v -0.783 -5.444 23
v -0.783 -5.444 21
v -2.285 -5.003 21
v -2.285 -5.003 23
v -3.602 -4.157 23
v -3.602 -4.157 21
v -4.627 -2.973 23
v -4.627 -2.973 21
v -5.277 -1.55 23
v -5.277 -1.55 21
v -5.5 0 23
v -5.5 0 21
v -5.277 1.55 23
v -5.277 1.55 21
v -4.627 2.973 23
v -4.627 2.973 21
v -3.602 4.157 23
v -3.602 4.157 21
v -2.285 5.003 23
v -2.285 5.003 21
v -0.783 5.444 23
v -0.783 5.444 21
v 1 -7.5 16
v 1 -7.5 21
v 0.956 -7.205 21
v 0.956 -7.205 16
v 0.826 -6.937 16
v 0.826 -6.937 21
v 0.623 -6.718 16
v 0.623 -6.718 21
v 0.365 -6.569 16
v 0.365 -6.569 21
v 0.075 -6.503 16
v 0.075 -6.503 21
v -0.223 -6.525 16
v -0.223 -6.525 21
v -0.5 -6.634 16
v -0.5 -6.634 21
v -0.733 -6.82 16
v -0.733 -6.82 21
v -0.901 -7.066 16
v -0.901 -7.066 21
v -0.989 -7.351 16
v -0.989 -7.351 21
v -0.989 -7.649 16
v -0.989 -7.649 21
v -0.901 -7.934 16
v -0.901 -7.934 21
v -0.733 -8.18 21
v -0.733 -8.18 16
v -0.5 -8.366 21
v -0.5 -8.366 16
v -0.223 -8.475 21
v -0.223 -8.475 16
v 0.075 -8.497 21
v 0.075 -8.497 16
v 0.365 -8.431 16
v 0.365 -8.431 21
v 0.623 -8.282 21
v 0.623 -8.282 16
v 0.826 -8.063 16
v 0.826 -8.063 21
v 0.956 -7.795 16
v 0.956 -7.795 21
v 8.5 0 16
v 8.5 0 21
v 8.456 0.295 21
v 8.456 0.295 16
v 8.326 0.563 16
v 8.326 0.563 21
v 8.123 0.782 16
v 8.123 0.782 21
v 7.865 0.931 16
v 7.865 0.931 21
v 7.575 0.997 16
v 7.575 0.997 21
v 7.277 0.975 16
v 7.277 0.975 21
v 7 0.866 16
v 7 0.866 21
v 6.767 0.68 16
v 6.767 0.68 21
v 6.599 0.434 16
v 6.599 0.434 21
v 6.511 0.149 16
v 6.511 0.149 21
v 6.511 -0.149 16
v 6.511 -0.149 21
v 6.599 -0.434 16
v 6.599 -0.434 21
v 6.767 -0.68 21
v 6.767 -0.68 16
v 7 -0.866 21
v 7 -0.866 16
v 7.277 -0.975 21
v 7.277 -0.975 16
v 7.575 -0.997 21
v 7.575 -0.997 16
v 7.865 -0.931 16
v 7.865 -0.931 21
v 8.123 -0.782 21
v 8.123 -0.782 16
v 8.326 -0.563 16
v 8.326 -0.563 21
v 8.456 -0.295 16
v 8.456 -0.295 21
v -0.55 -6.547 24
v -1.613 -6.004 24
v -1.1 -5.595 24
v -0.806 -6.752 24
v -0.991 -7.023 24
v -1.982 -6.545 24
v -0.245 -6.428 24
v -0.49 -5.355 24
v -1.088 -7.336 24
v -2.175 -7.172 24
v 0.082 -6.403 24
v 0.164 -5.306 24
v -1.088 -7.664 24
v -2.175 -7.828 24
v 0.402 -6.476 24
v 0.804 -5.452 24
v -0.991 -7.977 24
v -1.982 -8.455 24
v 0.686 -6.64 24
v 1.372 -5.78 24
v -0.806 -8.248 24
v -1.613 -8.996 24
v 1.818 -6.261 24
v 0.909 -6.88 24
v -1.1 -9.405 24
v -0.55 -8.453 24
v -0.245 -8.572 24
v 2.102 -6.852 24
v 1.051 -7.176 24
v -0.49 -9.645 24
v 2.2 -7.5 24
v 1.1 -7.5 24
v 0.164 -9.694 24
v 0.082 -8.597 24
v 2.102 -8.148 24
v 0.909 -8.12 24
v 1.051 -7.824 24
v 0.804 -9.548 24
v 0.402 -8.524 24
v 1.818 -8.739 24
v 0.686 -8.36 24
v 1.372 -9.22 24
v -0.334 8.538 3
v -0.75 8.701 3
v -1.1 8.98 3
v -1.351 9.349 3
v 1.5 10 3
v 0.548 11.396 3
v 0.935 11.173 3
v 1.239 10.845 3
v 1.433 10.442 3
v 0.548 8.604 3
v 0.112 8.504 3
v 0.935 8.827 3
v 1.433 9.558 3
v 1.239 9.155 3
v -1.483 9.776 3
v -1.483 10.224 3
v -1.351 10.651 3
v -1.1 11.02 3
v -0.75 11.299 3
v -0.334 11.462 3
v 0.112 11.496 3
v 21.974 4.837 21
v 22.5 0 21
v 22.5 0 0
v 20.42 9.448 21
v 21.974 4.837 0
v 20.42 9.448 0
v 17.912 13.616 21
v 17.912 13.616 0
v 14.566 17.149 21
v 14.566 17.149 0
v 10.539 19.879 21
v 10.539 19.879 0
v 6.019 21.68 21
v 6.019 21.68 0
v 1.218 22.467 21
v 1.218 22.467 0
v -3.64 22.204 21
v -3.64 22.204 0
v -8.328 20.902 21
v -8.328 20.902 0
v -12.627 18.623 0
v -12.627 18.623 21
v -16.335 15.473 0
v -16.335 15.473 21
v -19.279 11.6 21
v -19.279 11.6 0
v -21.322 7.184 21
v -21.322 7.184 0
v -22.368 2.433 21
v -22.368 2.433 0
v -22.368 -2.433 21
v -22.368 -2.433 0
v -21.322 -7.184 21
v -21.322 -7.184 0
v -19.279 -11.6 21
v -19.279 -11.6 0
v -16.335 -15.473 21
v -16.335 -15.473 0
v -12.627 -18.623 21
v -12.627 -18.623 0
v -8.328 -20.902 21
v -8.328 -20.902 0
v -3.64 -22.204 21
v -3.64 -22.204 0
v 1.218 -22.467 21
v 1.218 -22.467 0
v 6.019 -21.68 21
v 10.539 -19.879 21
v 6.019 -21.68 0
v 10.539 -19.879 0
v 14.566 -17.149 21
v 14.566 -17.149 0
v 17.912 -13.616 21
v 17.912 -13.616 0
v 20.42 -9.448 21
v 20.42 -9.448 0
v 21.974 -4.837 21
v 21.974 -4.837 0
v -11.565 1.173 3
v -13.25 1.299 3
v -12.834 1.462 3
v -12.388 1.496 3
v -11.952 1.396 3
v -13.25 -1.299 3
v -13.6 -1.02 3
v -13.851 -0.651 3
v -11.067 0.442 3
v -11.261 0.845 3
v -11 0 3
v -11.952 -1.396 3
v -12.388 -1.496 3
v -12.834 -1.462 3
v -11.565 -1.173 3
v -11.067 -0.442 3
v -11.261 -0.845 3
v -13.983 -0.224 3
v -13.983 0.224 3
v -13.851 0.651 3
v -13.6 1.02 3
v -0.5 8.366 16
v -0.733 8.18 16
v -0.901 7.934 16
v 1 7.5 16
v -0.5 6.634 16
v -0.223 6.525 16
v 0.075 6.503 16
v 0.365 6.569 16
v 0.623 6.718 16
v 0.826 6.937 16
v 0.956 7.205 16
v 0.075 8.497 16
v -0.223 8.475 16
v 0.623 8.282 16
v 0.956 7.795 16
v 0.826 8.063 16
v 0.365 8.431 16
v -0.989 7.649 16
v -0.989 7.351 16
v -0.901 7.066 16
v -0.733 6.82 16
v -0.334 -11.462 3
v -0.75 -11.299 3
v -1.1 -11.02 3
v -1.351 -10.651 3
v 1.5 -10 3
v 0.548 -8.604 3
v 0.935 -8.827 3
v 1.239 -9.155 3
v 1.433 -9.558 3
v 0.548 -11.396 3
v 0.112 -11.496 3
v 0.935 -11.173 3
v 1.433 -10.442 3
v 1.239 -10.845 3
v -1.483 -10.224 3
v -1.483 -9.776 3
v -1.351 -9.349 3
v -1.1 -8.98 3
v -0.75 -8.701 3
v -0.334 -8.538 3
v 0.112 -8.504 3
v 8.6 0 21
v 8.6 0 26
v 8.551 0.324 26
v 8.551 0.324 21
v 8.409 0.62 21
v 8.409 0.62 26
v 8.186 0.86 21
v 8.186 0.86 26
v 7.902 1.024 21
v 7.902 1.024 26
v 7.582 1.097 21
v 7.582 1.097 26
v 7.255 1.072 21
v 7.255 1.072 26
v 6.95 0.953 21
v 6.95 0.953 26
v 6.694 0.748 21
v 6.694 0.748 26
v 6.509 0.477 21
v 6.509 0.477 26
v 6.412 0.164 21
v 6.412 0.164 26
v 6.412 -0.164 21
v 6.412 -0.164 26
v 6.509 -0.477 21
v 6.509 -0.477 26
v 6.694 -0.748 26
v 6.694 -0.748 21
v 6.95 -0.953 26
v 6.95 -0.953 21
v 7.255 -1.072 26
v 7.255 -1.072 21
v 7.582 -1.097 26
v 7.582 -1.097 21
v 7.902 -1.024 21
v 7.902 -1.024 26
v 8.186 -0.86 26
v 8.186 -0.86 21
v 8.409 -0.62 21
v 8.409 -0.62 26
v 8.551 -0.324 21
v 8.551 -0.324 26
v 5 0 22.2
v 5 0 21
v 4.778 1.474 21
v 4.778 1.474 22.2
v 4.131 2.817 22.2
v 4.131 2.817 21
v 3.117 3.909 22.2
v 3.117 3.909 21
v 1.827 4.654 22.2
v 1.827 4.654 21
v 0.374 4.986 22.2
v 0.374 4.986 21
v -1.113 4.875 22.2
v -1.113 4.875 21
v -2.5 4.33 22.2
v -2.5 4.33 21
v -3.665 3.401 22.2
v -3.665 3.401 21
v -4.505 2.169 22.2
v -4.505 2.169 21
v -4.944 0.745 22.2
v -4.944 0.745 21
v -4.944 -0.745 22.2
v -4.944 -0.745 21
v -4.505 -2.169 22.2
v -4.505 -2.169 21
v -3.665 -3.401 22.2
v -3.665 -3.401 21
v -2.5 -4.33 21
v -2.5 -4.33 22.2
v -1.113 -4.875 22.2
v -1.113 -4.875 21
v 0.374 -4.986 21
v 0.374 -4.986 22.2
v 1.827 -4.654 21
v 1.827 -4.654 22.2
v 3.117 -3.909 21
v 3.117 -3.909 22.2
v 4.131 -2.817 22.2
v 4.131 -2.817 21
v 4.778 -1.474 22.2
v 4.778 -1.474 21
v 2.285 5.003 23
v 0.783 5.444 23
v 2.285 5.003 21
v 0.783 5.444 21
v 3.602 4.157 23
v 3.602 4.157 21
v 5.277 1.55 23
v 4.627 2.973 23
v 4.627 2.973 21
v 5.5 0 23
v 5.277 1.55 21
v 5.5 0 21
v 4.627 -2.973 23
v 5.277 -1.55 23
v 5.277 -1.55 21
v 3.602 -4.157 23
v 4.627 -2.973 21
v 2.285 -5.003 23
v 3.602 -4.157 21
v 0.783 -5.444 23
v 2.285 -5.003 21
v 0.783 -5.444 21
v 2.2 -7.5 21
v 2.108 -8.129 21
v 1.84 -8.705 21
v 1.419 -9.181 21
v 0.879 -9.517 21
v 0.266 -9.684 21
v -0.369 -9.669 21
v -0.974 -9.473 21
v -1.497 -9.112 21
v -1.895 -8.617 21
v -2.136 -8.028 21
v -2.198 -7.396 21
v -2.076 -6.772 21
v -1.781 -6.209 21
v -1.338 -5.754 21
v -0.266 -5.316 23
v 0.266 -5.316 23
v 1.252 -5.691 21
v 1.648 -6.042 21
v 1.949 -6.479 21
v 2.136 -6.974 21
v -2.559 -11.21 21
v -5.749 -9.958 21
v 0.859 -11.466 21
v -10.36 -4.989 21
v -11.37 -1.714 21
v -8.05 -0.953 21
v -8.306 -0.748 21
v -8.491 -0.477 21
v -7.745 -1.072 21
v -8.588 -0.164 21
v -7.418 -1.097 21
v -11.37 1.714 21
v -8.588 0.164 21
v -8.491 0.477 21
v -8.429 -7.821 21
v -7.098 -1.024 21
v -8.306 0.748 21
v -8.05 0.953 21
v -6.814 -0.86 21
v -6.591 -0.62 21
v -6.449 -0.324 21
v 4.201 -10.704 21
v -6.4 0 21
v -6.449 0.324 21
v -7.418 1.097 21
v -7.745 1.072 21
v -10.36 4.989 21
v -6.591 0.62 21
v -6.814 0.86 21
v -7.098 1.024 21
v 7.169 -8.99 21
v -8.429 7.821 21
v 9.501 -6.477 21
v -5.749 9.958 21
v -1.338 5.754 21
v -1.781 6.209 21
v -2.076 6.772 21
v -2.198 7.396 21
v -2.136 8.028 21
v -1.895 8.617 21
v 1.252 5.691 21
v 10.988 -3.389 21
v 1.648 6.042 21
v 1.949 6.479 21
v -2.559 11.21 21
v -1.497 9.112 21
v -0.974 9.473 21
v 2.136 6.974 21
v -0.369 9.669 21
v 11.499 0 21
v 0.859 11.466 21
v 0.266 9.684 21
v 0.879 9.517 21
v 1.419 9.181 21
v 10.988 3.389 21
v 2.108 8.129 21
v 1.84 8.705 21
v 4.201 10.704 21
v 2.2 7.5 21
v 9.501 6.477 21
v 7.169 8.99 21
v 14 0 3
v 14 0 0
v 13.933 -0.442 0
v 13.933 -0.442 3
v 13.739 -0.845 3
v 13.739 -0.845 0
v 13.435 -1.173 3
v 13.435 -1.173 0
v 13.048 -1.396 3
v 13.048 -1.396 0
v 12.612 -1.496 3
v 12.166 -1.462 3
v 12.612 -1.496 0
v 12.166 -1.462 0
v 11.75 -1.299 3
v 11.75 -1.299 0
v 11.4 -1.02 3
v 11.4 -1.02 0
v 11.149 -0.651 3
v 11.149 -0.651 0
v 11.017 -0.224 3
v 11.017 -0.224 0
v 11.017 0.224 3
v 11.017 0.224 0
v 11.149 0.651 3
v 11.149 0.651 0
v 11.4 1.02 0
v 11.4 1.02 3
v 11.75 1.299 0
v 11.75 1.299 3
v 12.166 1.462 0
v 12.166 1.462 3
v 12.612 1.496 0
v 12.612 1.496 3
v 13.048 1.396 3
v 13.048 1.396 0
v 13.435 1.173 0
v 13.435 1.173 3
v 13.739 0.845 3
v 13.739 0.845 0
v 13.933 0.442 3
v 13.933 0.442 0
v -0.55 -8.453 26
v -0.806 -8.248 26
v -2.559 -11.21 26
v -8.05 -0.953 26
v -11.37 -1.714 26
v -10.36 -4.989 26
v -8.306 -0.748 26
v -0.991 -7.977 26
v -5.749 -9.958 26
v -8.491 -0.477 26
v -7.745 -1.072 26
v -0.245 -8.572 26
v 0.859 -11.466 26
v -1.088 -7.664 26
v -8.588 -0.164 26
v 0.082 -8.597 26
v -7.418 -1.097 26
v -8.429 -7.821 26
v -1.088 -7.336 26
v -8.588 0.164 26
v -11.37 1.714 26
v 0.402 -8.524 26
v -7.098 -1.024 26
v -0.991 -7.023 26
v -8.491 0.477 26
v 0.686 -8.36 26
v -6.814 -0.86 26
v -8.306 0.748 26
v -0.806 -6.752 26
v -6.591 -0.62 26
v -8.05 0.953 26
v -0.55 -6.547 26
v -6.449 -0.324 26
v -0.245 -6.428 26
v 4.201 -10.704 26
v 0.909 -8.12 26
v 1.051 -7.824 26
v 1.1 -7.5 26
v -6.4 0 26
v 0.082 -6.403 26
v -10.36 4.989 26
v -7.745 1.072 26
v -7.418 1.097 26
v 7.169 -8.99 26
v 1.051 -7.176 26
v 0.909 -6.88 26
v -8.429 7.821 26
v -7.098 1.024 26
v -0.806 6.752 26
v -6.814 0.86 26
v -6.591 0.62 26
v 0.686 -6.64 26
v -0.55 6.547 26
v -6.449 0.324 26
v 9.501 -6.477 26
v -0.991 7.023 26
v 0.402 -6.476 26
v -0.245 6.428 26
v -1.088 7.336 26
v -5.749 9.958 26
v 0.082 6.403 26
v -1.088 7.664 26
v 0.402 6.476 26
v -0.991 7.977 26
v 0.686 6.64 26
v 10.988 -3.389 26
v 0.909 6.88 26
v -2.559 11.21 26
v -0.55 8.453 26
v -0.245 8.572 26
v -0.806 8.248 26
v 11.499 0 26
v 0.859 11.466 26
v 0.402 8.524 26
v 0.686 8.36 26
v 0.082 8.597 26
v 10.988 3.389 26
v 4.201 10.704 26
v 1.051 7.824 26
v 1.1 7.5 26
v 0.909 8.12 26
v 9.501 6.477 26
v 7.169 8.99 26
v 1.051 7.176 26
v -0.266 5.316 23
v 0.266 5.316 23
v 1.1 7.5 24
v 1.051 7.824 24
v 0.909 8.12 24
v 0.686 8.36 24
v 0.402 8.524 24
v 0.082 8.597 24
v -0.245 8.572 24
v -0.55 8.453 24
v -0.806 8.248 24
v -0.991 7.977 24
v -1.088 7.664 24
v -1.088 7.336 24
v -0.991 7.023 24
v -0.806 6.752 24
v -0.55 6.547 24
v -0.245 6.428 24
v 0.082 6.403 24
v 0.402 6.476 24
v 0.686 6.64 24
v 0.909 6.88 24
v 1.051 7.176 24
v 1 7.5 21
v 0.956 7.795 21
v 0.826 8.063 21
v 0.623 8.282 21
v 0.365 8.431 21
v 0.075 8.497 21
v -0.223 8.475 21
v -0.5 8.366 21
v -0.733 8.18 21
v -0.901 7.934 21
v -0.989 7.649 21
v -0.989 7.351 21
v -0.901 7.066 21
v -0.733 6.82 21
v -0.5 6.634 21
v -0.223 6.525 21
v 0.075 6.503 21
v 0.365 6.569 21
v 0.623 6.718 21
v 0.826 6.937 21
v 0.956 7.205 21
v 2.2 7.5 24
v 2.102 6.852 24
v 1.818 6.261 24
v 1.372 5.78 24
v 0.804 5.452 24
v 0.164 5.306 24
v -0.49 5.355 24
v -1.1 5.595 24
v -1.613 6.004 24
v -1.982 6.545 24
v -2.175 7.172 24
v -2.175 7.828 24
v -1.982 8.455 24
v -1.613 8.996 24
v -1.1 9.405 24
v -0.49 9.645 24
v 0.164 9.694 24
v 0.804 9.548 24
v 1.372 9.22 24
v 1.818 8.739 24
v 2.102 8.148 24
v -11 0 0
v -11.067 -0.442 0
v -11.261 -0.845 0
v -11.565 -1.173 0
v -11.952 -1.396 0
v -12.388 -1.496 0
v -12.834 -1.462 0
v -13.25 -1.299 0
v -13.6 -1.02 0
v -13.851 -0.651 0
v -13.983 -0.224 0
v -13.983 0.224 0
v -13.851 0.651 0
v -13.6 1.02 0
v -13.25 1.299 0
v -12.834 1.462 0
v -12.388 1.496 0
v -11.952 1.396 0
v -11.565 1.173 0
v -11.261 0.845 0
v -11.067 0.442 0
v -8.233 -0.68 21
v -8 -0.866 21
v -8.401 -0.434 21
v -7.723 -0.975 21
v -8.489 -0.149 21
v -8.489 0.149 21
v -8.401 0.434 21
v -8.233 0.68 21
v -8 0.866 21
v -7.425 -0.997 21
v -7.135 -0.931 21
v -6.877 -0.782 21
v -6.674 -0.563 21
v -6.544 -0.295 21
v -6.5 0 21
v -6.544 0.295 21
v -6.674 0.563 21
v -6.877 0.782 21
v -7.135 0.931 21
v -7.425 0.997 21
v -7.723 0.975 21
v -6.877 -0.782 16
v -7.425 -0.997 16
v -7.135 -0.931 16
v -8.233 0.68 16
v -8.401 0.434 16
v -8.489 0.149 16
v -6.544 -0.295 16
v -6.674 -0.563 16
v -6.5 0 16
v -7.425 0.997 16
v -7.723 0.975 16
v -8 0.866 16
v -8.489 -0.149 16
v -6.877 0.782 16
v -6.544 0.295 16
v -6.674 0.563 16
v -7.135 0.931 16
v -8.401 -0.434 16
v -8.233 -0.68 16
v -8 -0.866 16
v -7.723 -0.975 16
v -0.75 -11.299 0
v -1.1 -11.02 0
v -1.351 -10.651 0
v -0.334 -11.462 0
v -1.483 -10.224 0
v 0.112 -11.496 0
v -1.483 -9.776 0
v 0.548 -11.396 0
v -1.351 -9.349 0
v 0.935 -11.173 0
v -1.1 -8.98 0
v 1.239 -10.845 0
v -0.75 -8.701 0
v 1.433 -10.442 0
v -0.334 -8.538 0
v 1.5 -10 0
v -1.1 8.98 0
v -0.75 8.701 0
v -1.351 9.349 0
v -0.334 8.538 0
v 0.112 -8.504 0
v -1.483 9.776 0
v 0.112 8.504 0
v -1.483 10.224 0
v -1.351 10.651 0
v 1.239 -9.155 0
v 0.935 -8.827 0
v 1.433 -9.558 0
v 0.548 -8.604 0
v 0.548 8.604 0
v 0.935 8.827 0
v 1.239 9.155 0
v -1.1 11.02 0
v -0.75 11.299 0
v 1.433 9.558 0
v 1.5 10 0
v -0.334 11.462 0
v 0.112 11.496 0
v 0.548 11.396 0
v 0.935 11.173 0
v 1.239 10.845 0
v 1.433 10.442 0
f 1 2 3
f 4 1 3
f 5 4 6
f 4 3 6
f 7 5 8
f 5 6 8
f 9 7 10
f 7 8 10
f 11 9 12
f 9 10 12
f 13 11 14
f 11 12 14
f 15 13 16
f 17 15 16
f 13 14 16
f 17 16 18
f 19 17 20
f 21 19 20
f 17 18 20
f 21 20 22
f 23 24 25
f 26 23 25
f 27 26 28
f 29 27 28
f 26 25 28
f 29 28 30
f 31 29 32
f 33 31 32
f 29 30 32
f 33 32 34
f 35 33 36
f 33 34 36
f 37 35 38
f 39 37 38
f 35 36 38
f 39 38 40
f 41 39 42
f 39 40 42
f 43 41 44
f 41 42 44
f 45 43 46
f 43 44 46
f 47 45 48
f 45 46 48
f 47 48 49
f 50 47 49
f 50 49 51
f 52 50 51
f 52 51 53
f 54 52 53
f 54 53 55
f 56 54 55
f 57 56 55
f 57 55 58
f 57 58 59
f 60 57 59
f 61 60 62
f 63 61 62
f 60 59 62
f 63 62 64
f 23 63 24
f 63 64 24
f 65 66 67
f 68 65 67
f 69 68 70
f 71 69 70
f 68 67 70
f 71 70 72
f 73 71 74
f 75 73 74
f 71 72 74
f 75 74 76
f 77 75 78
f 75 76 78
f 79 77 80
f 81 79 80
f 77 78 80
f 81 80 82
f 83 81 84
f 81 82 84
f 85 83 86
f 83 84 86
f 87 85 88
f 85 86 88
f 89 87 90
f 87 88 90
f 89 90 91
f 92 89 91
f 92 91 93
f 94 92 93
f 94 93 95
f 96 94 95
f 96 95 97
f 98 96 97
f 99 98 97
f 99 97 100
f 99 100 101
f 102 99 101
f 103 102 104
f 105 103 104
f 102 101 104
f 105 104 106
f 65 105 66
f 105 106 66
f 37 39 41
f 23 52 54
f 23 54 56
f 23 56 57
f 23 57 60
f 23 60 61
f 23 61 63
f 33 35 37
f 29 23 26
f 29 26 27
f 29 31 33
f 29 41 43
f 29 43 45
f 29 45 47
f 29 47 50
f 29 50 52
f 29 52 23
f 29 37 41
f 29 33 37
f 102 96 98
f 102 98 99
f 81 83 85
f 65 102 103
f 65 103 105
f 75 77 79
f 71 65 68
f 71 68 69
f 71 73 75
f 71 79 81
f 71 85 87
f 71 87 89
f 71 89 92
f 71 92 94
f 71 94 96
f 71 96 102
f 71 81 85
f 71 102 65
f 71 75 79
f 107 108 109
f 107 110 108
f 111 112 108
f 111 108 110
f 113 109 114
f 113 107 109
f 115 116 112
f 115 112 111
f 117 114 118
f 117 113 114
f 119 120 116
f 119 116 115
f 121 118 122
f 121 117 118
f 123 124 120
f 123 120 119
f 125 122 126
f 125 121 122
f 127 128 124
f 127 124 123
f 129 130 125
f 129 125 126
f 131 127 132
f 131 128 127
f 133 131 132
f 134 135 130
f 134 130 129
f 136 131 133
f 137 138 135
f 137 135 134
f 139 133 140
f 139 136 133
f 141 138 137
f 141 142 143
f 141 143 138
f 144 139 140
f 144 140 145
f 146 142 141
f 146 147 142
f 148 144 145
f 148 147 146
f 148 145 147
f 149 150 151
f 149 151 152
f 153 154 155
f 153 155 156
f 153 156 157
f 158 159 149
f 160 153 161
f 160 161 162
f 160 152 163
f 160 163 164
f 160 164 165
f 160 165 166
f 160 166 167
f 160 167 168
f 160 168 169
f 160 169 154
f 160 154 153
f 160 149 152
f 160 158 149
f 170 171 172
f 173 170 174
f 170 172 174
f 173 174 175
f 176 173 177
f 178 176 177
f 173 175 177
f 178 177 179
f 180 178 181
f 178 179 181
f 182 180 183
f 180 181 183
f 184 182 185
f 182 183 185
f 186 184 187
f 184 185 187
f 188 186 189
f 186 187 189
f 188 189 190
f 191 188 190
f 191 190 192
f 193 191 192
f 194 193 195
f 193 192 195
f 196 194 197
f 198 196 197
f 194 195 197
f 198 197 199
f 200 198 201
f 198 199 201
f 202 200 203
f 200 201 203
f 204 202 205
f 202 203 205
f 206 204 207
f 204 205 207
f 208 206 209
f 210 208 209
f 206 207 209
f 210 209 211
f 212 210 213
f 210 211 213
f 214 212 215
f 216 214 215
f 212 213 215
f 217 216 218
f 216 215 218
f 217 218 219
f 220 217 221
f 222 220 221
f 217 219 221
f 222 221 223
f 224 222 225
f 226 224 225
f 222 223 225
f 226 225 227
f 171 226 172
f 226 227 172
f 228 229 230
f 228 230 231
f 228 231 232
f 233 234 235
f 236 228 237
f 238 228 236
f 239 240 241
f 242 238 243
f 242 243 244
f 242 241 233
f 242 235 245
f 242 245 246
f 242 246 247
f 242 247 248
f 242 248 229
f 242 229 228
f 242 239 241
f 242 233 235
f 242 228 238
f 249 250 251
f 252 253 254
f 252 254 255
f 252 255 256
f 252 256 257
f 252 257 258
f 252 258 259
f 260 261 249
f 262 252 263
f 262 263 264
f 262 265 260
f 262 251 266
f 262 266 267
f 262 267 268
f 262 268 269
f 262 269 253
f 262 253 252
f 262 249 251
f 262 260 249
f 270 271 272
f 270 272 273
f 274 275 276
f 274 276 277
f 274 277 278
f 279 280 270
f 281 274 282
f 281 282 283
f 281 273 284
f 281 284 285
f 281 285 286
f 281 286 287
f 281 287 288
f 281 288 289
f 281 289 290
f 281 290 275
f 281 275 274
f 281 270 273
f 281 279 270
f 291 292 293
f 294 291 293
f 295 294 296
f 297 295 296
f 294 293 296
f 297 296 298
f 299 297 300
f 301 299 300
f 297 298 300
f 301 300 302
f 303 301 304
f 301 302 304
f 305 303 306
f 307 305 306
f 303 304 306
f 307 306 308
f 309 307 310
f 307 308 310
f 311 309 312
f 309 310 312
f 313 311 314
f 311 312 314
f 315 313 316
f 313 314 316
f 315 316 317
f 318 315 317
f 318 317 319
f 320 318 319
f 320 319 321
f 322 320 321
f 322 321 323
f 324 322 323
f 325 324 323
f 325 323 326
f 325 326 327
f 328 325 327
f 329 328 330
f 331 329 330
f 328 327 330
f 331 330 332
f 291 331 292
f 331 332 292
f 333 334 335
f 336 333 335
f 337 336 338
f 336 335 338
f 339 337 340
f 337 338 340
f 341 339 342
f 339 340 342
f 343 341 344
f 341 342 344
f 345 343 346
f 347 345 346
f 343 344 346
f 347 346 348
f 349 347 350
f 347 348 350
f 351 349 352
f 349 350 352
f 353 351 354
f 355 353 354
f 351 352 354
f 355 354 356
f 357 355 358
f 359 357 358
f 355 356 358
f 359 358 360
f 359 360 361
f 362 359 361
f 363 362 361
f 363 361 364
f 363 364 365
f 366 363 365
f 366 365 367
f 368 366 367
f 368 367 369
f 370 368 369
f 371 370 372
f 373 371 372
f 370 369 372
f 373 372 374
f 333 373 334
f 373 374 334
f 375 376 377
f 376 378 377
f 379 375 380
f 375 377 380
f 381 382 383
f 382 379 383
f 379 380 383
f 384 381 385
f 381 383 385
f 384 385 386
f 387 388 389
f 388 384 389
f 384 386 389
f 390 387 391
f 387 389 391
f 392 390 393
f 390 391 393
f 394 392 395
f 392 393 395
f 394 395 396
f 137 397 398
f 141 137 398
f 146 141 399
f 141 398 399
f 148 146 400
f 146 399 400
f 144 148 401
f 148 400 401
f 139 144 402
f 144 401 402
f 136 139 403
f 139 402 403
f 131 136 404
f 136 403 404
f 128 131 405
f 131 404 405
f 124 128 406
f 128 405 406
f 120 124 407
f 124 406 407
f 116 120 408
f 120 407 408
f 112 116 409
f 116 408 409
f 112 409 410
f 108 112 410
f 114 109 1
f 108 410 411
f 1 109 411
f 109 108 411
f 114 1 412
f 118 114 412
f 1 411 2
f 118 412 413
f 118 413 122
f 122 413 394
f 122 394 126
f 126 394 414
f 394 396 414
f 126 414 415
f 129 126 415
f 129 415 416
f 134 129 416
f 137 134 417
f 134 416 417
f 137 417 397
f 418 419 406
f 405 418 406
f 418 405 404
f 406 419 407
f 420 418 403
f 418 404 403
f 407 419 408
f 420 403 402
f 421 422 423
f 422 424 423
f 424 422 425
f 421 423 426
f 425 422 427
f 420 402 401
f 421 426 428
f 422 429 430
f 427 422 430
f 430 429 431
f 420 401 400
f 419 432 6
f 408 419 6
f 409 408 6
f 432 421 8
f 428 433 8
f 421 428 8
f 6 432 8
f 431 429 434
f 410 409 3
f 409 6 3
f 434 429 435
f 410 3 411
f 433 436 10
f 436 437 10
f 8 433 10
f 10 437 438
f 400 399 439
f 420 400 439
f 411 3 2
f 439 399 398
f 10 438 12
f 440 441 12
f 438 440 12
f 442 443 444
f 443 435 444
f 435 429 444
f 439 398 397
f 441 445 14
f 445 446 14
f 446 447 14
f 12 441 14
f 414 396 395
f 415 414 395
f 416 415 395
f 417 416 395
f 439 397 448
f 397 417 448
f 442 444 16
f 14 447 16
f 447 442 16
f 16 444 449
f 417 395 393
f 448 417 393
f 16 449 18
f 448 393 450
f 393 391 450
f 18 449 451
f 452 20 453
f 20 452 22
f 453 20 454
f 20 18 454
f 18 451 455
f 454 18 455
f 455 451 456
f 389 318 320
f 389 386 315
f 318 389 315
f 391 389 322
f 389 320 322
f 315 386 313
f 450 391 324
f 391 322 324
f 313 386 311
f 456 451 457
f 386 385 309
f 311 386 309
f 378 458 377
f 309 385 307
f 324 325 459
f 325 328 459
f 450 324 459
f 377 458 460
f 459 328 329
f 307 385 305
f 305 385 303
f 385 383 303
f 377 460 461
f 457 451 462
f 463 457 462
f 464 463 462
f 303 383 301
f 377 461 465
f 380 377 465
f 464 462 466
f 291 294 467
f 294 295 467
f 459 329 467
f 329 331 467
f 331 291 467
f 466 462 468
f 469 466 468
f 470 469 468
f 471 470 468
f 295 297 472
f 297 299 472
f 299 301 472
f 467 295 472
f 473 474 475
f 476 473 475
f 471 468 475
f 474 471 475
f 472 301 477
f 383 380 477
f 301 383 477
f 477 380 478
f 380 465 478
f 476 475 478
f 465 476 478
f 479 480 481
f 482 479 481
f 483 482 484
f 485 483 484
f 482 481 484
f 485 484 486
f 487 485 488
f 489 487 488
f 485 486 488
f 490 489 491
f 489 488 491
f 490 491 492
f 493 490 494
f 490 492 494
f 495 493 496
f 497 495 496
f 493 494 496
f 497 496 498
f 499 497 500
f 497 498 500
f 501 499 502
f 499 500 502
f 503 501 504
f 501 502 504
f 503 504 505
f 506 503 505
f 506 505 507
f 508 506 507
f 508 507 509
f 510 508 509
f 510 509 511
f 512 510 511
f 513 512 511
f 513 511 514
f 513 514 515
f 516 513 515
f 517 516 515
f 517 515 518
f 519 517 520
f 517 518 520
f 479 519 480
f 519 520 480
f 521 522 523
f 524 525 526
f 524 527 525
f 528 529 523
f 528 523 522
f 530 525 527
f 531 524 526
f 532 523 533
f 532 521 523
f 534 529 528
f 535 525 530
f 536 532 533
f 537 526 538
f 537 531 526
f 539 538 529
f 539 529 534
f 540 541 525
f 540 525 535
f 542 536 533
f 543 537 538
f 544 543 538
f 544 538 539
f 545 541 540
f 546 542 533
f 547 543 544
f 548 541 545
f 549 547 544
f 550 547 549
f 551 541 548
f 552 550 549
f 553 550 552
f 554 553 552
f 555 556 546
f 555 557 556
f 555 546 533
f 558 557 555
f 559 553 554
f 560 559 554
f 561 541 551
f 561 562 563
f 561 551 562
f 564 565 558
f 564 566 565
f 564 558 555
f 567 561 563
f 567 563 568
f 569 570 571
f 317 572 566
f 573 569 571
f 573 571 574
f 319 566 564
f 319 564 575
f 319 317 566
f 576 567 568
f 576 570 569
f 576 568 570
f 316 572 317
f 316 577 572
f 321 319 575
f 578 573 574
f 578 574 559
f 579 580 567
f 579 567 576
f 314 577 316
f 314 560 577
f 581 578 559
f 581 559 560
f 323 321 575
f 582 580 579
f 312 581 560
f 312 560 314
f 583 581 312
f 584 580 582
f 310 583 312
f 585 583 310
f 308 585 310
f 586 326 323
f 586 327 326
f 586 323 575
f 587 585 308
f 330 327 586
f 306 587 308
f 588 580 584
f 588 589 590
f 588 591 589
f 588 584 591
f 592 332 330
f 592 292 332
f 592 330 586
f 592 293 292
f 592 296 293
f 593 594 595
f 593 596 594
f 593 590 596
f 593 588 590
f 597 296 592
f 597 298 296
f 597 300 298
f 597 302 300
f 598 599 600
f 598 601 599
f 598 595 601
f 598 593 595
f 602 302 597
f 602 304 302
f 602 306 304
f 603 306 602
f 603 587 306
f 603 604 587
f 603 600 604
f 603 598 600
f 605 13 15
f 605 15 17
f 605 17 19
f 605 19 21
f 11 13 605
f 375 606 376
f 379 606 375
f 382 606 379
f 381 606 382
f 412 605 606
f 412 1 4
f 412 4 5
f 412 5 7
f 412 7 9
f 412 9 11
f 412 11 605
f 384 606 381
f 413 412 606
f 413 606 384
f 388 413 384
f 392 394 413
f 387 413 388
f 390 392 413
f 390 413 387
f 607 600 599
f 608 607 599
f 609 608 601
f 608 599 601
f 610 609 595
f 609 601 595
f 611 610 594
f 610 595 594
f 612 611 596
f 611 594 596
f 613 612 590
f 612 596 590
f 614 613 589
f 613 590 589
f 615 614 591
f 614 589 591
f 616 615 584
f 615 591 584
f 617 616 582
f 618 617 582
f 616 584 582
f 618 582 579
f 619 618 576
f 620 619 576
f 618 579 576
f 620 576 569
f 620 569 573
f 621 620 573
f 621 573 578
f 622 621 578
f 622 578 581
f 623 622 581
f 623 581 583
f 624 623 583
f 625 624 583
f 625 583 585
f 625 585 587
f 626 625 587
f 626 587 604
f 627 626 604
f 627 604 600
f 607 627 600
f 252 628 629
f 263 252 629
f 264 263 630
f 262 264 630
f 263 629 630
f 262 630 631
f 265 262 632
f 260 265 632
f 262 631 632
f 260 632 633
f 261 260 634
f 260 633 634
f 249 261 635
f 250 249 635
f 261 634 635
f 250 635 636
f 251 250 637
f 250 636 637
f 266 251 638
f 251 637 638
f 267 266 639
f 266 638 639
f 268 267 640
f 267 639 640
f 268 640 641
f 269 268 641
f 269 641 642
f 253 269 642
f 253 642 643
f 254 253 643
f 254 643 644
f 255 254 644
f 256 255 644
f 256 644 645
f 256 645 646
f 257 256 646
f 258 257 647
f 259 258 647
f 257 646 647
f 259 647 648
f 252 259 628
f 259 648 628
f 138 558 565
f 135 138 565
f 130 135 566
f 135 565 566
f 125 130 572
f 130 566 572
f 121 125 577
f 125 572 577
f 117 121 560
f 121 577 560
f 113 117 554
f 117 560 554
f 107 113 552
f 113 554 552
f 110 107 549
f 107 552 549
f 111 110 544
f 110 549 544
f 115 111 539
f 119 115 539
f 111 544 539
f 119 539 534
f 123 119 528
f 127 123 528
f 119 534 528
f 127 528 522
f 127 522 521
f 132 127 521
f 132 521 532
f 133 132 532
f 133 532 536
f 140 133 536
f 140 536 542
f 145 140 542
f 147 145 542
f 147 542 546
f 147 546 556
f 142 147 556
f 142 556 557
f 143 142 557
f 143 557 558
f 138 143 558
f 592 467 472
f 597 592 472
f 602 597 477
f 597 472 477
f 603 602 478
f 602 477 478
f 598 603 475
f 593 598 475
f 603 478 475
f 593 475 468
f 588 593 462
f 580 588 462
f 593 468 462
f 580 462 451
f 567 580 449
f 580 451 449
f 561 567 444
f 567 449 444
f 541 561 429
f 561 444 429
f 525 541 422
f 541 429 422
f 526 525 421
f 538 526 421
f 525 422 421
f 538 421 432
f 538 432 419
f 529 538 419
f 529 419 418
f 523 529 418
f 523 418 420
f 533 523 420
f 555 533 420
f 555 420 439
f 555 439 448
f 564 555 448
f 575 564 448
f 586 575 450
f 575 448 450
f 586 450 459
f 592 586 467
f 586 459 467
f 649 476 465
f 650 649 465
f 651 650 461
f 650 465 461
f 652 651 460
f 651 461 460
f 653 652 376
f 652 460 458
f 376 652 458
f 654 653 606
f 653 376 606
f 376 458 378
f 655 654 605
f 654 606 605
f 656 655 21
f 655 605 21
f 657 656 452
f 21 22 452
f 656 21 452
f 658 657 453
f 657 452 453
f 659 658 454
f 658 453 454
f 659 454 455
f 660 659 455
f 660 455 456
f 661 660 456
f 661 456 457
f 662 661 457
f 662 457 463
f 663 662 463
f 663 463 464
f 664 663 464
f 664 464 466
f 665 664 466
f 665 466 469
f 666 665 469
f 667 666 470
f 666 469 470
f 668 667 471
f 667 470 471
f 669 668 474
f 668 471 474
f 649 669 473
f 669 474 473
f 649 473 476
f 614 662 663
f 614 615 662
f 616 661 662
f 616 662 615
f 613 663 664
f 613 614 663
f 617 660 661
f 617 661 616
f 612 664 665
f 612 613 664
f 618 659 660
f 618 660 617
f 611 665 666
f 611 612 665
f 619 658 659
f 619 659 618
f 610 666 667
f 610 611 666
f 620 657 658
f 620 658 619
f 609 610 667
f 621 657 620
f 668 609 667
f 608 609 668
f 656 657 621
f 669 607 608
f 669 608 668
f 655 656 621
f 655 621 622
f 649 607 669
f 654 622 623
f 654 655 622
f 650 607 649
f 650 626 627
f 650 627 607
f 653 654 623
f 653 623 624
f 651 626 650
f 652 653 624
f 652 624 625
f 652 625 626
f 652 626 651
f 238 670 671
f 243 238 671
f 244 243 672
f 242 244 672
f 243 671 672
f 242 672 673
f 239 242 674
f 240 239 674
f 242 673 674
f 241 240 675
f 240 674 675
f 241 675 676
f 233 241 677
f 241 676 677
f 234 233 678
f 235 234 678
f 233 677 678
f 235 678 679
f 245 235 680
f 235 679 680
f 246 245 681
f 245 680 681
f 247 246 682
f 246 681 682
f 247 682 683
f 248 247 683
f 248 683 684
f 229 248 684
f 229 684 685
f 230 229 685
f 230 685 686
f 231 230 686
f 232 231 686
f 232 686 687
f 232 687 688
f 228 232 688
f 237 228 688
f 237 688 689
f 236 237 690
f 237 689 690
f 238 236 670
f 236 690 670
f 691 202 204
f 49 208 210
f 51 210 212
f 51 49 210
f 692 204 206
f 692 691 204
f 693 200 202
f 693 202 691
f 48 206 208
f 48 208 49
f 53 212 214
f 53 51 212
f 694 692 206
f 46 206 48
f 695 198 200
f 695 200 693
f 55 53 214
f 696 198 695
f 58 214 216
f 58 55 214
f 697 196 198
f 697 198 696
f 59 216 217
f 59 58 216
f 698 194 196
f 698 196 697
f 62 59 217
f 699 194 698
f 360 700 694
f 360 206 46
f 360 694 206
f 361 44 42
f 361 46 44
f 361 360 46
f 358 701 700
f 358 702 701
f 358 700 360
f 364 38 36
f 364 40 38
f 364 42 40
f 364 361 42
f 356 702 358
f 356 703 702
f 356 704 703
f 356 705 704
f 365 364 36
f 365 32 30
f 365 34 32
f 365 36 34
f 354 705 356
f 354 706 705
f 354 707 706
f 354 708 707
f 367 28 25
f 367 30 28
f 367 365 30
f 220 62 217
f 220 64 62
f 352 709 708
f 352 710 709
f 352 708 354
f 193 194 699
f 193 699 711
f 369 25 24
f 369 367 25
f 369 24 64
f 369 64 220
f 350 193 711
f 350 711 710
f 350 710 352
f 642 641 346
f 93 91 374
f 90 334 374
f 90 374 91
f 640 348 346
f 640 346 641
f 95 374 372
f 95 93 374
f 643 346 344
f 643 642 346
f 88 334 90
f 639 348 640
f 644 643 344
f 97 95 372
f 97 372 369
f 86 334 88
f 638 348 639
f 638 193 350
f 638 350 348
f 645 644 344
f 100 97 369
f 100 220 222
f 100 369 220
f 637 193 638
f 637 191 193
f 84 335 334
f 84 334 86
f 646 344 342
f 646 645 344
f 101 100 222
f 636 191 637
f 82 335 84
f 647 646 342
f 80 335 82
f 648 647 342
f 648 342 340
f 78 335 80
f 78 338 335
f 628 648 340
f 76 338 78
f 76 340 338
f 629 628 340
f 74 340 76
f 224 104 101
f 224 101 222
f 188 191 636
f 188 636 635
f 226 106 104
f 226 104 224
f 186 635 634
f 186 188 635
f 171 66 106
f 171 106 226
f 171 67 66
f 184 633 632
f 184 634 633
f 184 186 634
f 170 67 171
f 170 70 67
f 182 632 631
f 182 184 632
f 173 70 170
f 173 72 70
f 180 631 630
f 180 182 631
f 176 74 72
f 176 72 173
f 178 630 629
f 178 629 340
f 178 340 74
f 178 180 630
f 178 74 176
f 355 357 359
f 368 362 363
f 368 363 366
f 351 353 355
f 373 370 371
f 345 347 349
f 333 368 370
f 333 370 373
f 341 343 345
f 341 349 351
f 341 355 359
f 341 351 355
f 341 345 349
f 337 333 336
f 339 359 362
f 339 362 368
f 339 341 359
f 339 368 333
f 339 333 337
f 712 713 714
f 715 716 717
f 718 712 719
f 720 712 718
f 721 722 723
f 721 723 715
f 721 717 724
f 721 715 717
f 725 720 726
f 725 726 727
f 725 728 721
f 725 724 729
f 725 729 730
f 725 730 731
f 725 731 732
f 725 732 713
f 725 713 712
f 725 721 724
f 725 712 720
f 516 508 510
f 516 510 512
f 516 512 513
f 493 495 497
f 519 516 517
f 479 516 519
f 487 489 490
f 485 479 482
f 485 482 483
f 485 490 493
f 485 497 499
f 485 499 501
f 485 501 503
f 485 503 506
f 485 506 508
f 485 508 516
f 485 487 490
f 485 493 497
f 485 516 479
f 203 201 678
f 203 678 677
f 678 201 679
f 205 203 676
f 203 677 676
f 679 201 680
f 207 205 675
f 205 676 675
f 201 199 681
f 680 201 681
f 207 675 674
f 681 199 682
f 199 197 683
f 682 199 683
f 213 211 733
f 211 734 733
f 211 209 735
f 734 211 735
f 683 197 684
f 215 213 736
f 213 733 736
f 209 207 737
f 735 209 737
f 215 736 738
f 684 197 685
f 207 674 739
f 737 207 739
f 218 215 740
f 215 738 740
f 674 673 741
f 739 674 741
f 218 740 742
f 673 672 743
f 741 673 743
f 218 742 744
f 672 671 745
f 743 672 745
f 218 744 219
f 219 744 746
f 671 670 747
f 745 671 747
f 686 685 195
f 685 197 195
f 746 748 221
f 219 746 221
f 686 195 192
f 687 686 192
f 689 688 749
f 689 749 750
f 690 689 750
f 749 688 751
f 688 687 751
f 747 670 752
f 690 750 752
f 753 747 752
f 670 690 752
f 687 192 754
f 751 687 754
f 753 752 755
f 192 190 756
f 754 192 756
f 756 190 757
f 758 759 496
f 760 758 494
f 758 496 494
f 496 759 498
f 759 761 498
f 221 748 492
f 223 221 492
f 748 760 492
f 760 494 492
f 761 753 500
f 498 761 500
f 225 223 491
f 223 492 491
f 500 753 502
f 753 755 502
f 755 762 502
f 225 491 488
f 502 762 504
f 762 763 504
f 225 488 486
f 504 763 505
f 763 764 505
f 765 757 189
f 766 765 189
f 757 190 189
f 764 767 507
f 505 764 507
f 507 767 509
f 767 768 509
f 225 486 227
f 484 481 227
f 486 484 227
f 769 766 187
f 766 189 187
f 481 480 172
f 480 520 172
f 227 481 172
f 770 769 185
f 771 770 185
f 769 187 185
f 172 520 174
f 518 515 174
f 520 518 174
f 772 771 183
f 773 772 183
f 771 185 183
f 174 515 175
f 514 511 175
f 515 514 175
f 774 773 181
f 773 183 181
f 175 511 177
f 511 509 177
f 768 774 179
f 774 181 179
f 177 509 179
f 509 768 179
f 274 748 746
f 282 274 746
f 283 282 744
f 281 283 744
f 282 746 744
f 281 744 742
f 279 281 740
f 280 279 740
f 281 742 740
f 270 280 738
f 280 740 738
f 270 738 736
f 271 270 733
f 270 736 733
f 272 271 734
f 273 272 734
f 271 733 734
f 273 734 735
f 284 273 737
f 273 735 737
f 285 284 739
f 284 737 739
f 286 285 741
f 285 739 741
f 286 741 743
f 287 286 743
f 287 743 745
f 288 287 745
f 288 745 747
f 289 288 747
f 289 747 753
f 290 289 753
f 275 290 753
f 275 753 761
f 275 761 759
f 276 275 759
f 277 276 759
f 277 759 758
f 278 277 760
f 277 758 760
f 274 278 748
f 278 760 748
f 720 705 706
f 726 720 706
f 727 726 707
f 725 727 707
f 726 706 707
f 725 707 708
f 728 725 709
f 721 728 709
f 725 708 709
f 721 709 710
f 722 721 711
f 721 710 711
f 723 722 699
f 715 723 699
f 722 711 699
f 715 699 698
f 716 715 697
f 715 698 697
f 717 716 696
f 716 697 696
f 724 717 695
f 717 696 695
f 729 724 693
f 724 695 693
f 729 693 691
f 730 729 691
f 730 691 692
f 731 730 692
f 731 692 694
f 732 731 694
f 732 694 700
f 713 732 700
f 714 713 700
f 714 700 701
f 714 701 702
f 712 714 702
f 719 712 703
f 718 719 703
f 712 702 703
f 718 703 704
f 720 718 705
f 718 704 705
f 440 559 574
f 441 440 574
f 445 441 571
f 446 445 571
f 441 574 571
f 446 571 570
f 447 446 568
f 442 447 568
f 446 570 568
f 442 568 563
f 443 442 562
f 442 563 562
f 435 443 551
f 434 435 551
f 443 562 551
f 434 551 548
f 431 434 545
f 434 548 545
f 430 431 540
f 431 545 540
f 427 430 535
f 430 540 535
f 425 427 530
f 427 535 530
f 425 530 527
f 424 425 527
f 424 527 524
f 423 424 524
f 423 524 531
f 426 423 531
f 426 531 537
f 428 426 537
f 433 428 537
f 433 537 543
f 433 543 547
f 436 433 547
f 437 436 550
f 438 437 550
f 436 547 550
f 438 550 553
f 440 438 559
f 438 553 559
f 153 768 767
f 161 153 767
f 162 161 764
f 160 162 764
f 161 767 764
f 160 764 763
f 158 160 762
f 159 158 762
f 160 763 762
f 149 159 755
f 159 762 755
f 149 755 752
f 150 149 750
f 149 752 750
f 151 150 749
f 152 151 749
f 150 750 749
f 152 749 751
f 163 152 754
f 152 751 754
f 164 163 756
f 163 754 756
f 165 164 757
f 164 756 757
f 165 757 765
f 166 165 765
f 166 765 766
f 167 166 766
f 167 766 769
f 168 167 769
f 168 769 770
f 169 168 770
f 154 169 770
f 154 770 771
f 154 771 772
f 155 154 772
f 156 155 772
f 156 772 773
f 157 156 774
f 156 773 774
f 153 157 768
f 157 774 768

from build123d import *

# Parameters (mm, degrees)
F0_R      = 22.5
F1_DEPTH  = 21
F2_R      = 1.5
F3_DEPTH  = 3
F4_R      = 5
F5_DEPTH  = 1.2
F6_R      = 1
F7_DEPTH  = 5
F8_R      = 11.4985777255
F9_DEPTH  = 5
F10_R     = 5.5
F11_DEPTH = 2
F12_R     = 1.1
F13_DEPTH = 5
F14_R     = 2.2
F15_DEPTH = 3


with BuildPart() as f1:
    # F0 (on Top) → F1 (new body)
    with BuildSketch(Plane.XY):
        Circle(F0_R)
    extrude(amount=F1_DEPTH)

    # F2 (on face) → F3 (cut)
    with BuildSketch(Plane(origin=(0, 0, 0), x_dir=(1, 0, 0), z_dir=(0, 0, -1))):
        with Locations((0, 10)):
            Circle(F2_R)
        with Locations((0, -10)):
            Circle(F2_R)
        with Locations((12.5, 0)):
            Circle(F2_R)
        with Locations((-12.5, 0)):
            Circle(F2_R)
    extrude(amount=-F3_DEPTH, mode=Mode.SUBTRACT)

    # F4 (on face) → F5 (join)
    with BuildSketch(Plane.XY.offset(21)):
        Circle(F4_R)
    extrude(amount=F5_DEPTH)

    # F6 (on face) → F7 (cut)
    with BuildSketch(Plane.XY.offset(21)):
        with Locations((0, 7.5)):
            Circle(F6_R)
        with Locations((0, -7.5)):
            Circle(F6_R)
        with Locations((7.5, 0)):
            Circle(F6_R)
        with Locations((-7.5, 0)):
            Circle(F6_R)
    extrude(amount=-F7_DEPTH, mode=Mode.SUBTRACT)


with BuildPart() as f9:
    # F8 (on face) → F9 (new body)
    with BuildSketch(Plane.XY.offset(21)):
        Circle(F8_R)
    extrude(amount=F9_DEPTH)

    # F10 (on face) → F11 (cut)
    with BuildSketch(Plane(origin=(0, 0, 21), x_dir=(1, 0, 0), z_dir=(0, 0, -1))):
        Circle(F10_R)
    extrude(amount=-F11_DEPTH, mode=Mode.SUBTRACT)

    # F12 (on face) → F13 (cut, through all)
    with BuildSketch(Plane.XY.offset(26)):
        with Locations((-7.5, 0)):
            Circle(F12_R)
        with Locations((0, 7.5)):
            Circle(F12_R)
        with Locations((7.5, 0)):
            Circle(F12_R)
        with Locations((0, -7.5)):
            Circle(F12_R)
    extrude(amount=-F13_DEPTH, mode=Mode.SUBTRACT)

    # F14 (on face) → F15 (cut)
    with BuildSketch(Plane(origin=(0, 0, 21), x_dir=(1, 0, 0), z_dir=(0, 0, -1))):
        with Locations((0, 7.5)):
            Circle(F14_R)
        with Locations((0, -7.5)):
            Circle(F14_R)
    extrude(amount=-F15_DEPTH, mode=Mode.SUBTRACT)


solid = Compound([f1.part, f9.part])
